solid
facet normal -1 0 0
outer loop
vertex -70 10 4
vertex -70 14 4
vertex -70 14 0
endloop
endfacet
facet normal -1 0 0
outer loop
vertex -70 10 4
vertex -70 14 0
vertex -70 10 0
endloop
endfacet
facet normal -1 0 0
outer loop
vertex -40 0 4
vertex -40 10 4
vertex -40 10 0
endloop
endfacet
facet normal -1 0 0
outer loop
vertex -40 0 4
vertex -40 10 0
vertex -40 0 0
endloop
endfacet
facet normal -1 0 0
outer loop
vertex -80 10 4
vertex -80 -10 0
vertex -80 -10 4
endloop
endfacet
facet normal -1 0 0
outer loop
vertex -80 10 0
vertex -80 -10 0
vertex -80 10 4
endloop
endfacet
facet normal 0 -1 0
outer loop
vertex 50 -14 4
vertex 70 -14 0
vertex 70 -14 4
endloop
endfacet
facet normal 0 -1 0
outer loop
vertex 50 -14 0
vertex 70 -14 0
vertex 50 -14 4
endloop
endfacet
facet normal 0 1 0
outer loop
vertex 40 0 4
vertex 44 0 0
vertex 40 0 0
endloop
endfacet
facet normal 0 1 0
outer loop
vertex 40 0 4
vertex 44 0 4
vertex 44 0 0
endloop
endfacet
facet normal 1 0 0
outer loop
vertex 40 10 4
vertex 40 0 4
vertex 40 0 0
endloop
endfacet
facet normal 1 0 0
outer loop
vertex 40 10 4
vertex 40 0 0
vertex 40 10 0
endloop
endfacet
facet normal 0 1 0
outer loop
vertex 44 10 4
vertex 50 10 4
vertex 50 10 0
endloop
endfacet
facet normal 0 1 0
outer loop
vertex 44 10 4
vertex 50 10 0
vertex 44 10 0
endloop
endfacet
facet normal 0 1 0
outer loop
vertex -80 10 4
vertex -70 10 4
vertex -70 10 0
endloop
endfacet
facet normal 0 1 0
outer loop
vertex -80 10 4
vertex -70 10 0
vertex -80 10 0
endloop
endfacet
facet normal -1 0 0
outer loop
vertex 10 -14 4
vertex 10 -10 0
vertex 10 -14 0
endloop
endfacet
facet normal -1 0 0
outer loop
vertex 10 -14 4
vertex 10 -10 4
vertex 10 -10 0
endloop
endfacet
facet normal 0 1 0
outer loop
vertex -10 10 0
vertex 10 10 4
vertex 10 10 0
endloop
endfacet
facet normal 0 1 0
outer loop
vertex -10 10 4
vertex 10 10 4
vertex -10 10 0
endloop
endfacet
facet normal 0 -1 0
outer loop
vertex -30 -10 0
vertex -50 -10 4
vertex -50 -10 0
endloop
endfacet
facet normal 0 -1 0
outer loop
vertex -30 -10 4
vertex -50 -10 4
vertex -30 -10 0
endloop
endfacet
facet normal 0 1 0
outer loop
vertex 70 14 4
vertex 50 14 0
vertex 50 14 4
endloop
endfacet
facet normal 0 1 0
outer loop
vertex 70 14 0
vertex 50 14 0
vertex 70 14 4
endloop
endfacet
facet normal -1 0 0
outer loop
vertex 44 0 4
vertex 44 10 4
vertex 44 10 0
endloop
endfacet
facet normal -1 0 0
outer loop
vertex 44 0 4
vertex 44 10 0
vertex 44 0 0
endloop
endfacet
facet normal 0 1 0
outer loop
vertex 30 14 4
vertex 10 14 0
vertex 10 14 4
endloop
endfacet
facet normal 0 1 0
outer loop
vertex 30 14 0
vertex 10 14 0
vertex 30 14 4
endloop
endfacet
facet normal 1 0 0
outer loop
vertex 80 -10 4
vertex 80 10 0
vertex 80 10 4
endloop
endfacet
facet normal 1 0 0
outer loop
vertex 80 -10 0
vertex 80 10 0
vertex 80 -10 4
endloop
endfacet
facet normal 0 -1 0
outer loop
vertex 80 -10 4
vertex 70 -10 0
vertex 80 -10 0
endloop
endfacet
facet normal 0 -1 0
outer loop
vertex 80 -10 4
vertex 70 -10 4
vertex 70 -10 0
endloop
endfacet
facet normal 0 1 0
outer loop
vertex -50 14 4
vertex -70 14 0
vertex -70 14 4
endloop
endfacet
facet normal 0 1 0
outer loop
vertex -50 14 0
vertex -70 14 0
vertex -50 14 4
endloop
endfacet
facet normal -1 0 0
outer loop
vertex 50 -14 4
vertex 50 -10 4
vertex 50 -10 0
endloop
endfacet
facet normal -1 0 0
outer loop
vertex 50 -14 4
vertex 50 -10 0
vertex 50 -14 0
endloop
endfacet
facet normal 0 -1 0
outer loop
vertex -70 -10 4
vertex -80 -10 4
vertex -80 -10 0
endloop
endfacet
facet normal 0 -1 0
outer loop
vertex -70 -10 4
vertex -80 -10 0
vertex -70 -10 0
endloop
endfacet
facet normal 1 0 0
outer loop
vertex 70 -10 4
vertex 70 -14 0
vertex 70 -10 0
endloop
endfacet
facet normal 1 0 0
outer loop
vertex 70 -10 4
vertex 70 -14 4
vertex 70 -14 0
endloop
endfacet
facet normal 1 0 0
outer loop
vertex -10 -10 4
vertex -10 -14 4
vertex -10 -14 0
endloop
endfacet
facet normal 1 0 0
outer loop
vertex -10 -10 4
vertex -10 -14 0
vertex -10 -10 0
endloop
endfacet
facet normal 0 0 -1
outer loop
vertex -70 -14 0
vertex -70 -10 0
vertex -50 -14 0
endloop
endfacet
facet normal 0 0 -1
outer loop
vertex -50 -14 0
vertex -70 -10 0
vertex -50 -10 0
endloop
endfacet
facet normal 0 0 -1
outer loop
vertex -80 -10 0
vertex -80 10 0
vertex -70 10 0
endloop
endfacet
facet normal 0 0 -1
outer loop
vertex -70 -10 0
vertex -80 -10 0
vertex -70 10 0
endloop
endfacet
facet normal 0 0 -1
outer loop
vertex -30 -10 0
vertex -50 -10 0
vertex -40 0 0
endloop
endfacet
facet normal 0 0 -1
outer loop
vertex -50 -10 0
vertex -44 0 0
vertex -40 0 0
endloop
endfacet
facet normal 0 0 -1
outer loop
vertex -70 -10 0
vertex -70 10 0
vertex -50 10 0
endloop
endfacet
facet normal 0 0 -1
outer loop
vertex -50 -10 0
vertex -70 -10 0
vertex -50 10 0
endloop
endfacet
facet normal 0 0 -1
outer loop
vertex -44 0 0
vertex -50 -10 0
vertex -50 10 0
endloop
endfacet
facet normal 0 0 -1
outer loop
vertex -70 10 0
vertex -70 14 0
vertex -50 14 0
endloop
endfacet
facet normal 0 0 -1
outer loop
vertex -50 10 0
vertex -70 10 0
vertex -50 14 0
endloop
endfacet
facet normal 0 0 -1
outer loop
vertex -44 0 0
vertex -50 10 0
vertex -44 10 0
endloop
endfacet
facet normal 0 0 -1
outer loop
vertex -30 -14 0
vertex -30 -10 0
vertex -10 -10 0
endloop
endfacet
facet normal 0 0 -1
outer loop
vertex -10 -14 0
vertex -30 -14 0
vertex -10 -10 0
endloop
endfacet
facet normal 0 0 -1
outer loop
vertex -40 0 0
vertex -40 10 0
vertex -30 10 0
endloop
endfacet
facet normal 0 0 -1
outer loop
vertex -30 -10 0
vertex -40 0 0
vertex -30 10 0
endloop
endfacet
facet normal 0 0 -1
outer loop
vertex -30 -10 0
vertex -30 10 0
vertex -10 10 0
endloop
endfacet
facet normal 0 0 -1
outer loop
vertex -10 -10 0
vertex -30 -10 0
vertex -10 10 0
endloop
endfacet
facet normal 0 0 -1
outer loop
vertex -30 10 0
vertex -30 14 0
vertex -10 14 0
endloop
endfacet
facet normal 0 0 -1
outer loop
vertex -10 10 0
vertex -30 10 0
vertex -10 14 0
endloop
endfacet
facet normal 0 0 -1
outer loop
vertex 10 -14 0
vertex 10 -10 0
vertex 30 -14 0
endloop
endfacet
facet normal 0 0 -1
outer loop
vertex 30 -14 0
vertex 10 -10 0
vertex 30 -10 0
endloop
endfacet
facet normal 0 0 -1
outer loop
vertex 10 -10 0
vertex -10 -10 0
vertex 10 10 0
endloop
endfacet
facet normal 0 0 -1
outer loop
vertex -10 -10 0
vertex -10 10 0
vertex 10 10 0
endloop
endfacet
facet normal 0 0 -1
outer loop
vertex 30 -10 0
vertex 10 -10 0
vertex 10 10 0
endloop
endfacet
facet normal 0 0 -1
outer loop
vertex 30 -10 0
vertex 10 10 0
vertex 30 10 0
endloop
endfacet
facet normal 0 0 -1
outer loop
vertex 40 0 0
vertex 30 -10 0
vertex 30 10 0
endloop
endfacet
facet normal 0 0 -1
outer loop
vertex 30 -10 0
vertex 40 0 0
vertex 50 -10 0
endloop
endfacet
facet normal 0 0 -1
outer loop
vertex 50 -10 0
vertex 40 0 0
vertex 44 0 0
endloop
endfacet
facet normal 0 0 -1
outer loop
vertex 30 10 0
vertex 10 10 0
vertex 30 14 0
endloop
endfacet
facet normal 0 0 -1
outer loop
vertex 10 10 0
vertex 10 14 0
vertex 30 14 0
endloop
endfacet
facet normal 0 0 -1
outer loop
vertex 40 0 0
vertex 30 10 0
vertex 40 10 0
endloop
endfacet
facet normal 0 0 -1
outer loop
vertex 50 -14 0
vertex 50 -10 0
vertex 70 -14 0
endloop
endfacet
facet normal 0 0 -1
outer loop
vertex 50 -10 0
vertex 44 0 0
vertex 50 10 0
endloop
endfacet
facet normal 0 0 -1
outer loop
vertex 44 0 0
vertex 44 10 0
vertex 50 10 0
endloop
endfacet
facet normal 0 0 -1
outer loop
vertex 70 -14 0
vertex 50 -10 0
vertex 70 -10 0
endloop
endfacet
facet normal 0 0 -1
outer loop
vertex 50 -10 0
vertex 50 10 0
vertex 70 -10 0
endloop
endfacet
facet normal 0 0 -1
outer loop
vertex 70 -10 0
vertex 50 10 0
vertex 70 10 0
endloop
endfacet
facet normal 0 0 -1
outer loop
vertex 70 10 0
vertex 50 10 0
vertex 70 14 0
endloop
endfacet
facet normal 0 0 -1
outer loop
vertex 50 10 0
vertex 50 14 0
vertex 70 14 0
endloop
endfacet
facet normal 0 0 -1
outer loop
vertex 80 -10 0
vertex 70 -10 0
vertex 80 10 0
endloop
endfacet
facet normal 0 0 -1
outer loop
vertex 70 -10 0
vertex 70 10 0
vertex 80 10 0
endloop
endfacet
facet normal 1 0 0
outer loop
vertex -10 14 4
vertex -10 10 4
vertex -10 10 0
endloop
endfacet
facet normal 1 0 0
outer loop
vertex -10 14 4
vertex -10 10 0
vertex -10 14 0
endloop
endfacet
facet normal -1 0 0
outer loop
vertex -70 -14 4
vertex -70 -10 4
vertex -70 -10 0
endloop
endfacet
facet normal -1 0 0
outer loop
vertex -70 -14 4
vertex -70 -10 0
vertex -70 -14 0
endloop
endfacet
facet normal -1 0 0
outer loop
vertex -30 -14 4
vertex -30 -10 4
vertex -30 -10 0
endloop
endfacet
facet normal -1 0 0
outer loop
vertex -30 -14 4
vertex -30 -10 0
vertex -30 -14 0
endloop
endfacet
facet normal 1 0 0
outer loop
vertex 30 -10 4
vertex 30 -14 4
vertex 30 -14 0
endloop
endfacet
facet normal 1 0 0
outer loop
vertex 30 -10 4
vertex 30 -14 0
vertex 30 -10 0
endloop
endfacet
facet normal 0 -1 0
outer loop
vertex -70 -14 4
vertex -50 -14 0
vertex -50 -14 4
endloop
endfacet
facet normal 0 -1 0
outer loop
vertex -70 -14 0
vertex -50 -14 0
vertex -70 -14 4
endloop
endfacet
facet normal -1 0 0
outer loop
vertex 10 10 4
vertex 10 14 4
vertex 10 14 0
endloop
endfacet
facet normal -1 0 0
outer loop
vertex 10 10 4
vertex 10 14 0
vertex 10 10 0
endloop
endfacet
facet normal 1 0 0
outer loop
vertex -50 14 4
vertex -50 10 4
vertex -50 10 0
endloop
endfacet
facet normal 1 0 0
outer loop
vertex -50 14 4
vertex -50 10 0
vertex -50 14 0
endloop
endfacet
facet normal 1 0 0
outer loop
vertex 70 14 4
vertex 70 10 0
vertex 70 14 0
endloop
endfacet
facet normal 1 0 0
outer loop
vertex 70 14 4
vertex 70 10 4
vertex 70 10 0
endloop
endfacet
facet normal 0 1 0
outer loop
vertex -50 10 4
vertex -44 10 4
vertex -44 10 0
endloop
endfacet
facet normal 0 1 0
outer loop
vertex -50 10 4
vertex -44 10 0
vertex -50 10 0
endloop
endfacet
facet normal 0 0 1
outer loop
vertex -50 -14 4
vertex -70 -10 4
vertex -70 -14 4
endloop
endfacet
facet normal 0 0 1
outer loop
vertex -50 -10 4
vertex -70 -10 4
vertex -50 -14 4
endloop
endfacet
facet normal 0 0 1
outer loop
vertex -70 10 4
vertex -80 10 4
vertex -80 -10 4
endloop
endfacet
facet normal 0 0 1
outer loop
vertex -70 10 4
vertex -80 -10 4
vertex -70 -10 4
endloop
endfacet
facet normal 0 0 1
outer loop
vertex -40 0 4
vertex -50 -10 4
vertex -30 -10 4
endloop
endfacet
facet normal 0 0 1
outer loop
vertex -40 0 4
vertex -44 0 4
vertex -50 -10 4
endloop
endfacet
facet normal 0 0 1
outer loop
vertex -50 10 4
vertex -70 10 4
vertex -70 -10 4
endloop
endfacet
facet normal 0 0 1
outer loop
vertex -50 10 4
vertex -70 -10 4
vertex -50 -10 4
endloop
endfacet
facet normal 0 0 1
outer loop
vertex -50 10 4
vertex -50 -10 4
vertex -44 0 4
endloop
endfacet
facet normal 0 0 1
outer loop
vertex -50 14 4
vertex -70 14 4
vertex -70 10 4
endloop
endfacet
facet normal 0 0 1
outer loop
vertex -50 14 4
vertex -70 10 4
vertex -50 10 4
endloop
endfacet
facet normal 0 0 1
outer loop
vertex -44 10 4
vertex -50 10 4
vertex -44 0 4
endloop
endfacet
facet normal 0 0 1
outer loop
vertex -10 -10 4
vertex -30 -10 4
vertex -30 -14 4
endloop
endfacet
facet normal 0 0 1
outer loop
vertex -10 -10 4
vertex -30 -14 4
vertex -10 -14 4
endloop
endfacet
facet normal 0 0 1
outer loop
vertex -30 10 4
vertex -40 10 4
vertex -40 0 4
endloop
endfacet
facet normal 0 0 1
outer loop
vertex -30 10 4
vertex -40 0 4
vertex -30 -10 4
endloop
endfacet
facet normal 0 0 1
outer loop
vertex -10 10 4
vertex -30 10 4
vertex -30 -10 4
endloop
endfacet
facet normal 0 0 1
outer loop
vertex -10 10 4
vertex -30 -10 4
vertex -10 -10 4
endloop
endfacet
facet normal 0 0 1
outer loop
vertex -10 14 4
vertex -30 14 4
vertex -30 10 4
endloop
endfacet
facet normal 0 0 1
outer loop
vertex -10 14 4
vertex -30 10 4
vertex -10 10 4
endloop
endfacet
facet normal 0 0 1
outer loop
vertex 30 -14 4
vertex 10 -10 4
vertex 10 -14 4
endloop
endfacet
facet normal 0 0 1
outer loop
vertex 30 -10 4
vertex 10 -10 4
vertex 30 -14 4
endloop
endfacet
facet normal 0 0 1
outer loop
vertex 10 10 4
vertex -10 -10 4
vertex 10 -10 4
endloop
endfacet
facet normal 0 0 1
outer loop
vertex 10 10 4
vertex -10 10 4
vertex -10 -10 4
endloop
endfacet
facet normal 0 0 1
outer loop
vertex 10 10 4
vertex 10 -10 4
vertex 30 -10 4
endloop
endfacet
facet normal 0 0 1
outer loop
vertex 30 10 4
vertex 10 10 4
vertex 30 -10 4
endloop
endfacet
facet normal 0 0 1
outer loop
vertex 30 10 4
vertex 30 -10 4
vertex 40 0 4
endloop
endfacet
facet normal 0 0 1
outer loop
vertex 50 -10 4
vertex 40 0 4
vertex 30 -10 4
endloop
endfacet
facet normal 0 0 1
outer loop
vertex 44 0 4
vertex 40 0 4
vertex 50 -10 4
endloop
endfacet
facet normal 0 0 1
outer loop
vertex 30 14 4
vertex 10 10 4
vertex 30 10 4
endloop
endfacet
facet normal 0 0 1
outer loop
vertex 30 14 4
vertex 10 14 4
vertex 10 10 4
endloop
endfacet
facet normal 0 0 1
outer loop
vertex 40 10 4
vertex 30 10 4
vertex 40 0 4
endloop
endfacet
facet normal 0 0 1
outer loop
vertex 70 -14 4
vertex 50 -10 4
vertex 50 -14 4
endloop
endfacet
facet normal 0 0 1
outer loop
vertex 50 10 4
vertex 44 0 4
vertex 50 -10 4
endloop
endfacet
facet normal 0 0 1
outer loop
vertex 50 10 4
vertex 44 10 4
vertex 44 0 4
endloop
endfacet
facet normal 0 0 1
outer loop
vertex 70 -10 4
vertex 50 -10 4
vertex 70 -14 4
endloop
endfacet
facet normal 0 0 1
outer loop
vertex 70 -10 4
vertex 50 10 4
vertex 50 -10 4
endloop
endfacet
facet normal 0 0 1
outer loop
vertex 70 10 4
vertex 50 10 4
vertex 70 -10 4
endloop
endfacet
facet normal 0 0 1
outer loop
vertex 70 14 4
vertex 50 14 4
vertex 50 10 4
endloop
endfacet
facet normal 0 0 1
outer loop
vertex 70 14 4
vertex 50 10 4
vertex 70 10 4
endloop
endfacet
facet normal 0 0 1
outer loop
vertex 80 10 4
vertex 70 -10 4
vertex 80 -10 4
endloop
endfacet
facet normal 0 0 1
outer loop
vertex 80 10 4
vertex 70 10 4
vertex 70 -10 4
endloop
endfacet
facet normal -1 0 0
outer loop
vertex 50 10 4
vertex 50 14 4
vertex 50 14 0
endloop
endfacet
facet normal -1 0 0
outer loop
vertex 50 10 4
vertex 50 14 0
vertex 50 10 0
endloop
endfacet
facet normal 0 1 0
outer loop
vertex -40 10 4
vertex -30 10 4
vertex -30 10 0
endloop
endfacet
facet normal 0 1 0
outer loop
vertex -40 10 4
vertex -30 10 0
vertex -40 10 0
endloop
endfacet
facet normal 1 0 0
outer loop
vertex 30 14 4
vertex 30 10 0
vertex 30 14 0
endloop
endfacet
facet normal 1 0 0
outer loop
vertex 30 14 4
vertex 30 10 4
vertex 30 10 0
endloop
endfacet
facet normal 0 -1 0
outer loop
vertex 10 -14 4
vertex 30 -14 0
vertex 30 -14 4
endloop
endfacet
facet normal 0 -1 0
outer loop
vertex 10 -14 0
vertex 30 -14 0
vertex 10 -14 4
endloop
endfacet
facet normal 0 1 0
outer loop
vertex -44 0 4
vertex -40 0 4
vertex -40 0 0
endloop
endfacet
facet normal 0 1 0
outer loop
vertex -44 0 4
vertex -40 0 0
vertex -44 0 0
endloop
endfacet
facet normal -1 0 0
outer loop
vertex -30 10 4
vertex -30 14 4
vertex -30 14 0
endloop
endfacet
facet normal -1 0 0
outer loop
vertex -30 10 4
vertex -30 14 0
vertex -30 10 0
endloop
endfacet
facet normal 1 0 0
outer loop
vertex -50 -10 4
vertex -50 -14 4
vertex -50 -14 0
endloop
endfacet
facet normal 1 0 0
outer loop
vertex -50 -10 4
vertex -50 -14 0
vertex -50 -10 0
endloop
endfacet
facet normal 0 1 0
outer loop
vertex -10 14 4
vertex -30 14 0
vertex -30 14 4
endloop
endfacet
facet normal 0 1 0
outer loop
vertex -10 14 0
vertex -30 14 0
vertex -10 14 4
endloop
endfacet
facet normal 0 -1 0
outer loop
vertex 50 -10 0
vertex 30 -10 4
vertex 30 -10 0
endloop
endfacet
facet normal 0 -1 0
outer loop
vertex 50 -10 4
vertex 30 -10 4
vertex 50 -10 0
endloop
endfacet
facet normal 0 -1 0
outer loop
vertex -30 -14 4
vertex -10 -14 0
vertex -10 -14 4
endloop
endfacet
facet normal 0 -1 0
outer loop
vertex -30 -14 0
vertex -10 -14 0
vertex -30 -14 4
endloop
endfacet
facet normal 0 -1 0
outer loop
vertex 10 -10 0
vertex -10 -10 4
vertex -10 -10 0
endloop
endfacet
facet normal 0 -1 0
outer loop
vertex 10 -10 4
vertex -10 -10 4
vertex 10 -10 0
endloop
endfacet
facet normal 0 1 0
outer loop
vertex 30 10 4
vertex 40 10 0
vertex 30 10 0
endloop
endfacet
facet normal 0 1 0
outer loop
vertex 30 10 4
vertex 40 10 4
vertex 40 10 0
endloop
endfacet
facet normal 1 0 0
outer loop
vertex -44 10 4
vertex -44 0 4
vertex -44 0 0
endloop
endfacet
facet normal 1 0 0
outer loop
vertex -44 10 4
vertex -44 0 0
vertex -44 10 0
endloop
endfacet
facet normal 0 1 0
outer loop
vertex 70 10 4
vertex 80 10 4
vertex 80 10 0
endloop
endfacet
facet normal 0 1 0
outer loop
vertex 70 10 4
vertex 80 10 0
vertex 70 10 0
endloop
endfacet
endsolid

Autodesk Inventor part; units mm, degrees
ref_plane "YZ Plane" through (0, 0, 0) normal (1, 0, 0) x (0, 1, 0)
ref_plane "XZ Plane" through (0, 0, 0) normal (0, 1, 0) x (-1, 0, 0)
ref_plane "XY Plane" through (0, 0, 0) normal (0, 0, 1) x (1, 0, 0)
sketch "Sketch1" plane through (0, 0, 0) normal (0, 0, 1) x (1, 0, 0)
  line L0 (-80, 14) -> (80, 14)
  line L1 (80, 14) -> (80, -14)
  line L2 (80, -14) -> (-80, -14)
  line L3 (-80, -14) -> (-80, 14)
  point P0 (0, 0)
  dimension "d0" = 160
  dimension "d1" = 28
  dimension "d2" = 14
  dimension "d3" = 80
extrude "Base" add sketch "Sketch1" along normal blind 4
sketch "Sketch2" plane through (0, 0, 4) normal (0, 0, 1) x (1, 0, 0)
  line L0 (-80, 14) -> (80, 14) projected
  line L1 (80, -14) -> (-80, -14) projected
  line L2 (-50, 14) -> (-30, 14)
  line L3 (-30, 14) -> (-30, 10)
  line L4 (-30, 10) -> (-50, 10)
  line L5 (-50, 10) -> (-50, 14)
  line L6 (-10, 14) -> (10, 14)
  line L7 (10, 14) -> (10, 10)
  line L8 (10, 10) -> (-10, 10)
  line L9 (-10, 10) -> (-10, 14)
  line L10 (30, 14) -> (50, 14)
  line L11 (50, 14) -> (50, 10)
  line L12 (50, 10) -> (30, 10)
  line L13 (30, 10) -> (30, 14)
  line L14 (-50, -10) -> (-30, -10)
  line L15 (-30, -10) -> (-30, -14)
  line L16 (-30, -14) -> (-50, -14)
  line L17 (-50, -14) -> (-50, -10)
  line L18 (-10, -10) -> (10, -10)
  line L19 (10, -10) -> (10, -14)
  line L20 (10, -14) -> (-10, -14)
  line L21 (-10, -14) -> (-10, -10)
  line L22 (30, -10) -> (50, -10)
  line L23 (50, -10) -> (50, -14)
  line L24 (50, -14) -> (30, -14)
  line L25 (30, -14) -> (30, -10)
  line L26 (80, 14) -> (80, -14) projected
  line L27 (-80, -14) -> (-80, 14) projected
  line L28 (-80, -10) -> (-70, -10)
  line L29 (-70, -10) -> (-70, -14)
  line L30 (-70, -14) -> (-80, -14)
  line L31 (-80, -14) -> (-80, -10)
  line L32 (-80, 14) -> (-70, 14)
  line L33 (-70, 14) -> (-70, 10)
  line L34 (-70, 10) -> (-80, 10)
  line L35 (-80, 10) -> (-80, 14)
  line L36 (70, 14) -> (80, 14)
  line L37 (80, 14) -> (80, 10)
  line L38 (80, 10) -> (70, 10)
  line L39 (70, 10) -> (70, 14)
  line L40 (70, -10) -> (80, -10)
  line L41 (80, -10) -> (80, -14)
  line L42 (80, -14) -> (70, -14)
  line L43 (70, -14) -> (70, -10)
  point P0 (0, 0)
  dimension "d6" = 20
  dimension "d7" = 4
  dimension "d10" = 40
  dimension "d19" = 20
  dimension "d20" = 4
  dimension "d21" = 40
  dimension "d25" = 0
  dimension "d40" = 4
  dimension "d42" = 10
  dimension "d43" = 10
  dimension "d44" = 10
  dimension "d45" = 4
  dimension "d54" = 10
  dimension "d55" = 4
  dimension "d64" = 10
  dimension "d65" = 4
  dimension "d74" = 10
  dimension "d75" = 4
  dimension "d76" = 0
  dimension "d77" = 0
  dimension "d78" = 0
  dimension "d79" = 0
  dimension "d80" = 0
  dimension "d81" = 0
  dimension "d82" = 0
  dimension "d83" = 0
extrude "Platformsleeves" cut sketch "Sketch2" against normal blind 4 contours L0 L33 L34 L27 | L0 L3 L4 L5 | L28 L29 L1 L27 | L0 L7 L8 L9 | L17 L14 L15 L1 | L0 L11 L12 L13 | L21 L18 L19 L1 | L0 L26 L38 L39 | L25 L22 L23 L1 | L26 L1 L43 L40
sketch "Sketch4" plane through (0, 0, 4) normal (0, 0, 1) x (1, 0, 0)
  line L0 (30, 10) -> (30, 14) projected
  line L1 (-30, 14) -> (-30, 10) projected
  line L2 (-30, 10) -> (-50, 10) projected
  line L3 (50, 10) -> (30, 10) projected
  line L4 (-44, 10) -> (-40, 10)
  line L5 (-40, 10) -> (-40, 0)
  line L6 (-40, 0) -> (-44, 0)
  line L7 (-44, 0) -> (-44, 10)
  line L8 (40, 10) -> (44, 10)
  line L9 (44, 10) -> (44, 0)
  line L10 (44, 0) -> (40, 0)
  line L11 (40, 0) -> (40, 10)
  point P0 (0, 0)
  dimension "d86" = 4
  dimension "d87" = 10
  dimension "d88" = 10
  dimension "d89" = 0
  dimension "d90" = 4
  dimension "d91" = 10
  dimension "d92" = 10
  dimension "d93" = 0
extrude "Sleeves" cut sketch "Sketch4" against normal blind 4
properties part number "LongMiddleStructure"
